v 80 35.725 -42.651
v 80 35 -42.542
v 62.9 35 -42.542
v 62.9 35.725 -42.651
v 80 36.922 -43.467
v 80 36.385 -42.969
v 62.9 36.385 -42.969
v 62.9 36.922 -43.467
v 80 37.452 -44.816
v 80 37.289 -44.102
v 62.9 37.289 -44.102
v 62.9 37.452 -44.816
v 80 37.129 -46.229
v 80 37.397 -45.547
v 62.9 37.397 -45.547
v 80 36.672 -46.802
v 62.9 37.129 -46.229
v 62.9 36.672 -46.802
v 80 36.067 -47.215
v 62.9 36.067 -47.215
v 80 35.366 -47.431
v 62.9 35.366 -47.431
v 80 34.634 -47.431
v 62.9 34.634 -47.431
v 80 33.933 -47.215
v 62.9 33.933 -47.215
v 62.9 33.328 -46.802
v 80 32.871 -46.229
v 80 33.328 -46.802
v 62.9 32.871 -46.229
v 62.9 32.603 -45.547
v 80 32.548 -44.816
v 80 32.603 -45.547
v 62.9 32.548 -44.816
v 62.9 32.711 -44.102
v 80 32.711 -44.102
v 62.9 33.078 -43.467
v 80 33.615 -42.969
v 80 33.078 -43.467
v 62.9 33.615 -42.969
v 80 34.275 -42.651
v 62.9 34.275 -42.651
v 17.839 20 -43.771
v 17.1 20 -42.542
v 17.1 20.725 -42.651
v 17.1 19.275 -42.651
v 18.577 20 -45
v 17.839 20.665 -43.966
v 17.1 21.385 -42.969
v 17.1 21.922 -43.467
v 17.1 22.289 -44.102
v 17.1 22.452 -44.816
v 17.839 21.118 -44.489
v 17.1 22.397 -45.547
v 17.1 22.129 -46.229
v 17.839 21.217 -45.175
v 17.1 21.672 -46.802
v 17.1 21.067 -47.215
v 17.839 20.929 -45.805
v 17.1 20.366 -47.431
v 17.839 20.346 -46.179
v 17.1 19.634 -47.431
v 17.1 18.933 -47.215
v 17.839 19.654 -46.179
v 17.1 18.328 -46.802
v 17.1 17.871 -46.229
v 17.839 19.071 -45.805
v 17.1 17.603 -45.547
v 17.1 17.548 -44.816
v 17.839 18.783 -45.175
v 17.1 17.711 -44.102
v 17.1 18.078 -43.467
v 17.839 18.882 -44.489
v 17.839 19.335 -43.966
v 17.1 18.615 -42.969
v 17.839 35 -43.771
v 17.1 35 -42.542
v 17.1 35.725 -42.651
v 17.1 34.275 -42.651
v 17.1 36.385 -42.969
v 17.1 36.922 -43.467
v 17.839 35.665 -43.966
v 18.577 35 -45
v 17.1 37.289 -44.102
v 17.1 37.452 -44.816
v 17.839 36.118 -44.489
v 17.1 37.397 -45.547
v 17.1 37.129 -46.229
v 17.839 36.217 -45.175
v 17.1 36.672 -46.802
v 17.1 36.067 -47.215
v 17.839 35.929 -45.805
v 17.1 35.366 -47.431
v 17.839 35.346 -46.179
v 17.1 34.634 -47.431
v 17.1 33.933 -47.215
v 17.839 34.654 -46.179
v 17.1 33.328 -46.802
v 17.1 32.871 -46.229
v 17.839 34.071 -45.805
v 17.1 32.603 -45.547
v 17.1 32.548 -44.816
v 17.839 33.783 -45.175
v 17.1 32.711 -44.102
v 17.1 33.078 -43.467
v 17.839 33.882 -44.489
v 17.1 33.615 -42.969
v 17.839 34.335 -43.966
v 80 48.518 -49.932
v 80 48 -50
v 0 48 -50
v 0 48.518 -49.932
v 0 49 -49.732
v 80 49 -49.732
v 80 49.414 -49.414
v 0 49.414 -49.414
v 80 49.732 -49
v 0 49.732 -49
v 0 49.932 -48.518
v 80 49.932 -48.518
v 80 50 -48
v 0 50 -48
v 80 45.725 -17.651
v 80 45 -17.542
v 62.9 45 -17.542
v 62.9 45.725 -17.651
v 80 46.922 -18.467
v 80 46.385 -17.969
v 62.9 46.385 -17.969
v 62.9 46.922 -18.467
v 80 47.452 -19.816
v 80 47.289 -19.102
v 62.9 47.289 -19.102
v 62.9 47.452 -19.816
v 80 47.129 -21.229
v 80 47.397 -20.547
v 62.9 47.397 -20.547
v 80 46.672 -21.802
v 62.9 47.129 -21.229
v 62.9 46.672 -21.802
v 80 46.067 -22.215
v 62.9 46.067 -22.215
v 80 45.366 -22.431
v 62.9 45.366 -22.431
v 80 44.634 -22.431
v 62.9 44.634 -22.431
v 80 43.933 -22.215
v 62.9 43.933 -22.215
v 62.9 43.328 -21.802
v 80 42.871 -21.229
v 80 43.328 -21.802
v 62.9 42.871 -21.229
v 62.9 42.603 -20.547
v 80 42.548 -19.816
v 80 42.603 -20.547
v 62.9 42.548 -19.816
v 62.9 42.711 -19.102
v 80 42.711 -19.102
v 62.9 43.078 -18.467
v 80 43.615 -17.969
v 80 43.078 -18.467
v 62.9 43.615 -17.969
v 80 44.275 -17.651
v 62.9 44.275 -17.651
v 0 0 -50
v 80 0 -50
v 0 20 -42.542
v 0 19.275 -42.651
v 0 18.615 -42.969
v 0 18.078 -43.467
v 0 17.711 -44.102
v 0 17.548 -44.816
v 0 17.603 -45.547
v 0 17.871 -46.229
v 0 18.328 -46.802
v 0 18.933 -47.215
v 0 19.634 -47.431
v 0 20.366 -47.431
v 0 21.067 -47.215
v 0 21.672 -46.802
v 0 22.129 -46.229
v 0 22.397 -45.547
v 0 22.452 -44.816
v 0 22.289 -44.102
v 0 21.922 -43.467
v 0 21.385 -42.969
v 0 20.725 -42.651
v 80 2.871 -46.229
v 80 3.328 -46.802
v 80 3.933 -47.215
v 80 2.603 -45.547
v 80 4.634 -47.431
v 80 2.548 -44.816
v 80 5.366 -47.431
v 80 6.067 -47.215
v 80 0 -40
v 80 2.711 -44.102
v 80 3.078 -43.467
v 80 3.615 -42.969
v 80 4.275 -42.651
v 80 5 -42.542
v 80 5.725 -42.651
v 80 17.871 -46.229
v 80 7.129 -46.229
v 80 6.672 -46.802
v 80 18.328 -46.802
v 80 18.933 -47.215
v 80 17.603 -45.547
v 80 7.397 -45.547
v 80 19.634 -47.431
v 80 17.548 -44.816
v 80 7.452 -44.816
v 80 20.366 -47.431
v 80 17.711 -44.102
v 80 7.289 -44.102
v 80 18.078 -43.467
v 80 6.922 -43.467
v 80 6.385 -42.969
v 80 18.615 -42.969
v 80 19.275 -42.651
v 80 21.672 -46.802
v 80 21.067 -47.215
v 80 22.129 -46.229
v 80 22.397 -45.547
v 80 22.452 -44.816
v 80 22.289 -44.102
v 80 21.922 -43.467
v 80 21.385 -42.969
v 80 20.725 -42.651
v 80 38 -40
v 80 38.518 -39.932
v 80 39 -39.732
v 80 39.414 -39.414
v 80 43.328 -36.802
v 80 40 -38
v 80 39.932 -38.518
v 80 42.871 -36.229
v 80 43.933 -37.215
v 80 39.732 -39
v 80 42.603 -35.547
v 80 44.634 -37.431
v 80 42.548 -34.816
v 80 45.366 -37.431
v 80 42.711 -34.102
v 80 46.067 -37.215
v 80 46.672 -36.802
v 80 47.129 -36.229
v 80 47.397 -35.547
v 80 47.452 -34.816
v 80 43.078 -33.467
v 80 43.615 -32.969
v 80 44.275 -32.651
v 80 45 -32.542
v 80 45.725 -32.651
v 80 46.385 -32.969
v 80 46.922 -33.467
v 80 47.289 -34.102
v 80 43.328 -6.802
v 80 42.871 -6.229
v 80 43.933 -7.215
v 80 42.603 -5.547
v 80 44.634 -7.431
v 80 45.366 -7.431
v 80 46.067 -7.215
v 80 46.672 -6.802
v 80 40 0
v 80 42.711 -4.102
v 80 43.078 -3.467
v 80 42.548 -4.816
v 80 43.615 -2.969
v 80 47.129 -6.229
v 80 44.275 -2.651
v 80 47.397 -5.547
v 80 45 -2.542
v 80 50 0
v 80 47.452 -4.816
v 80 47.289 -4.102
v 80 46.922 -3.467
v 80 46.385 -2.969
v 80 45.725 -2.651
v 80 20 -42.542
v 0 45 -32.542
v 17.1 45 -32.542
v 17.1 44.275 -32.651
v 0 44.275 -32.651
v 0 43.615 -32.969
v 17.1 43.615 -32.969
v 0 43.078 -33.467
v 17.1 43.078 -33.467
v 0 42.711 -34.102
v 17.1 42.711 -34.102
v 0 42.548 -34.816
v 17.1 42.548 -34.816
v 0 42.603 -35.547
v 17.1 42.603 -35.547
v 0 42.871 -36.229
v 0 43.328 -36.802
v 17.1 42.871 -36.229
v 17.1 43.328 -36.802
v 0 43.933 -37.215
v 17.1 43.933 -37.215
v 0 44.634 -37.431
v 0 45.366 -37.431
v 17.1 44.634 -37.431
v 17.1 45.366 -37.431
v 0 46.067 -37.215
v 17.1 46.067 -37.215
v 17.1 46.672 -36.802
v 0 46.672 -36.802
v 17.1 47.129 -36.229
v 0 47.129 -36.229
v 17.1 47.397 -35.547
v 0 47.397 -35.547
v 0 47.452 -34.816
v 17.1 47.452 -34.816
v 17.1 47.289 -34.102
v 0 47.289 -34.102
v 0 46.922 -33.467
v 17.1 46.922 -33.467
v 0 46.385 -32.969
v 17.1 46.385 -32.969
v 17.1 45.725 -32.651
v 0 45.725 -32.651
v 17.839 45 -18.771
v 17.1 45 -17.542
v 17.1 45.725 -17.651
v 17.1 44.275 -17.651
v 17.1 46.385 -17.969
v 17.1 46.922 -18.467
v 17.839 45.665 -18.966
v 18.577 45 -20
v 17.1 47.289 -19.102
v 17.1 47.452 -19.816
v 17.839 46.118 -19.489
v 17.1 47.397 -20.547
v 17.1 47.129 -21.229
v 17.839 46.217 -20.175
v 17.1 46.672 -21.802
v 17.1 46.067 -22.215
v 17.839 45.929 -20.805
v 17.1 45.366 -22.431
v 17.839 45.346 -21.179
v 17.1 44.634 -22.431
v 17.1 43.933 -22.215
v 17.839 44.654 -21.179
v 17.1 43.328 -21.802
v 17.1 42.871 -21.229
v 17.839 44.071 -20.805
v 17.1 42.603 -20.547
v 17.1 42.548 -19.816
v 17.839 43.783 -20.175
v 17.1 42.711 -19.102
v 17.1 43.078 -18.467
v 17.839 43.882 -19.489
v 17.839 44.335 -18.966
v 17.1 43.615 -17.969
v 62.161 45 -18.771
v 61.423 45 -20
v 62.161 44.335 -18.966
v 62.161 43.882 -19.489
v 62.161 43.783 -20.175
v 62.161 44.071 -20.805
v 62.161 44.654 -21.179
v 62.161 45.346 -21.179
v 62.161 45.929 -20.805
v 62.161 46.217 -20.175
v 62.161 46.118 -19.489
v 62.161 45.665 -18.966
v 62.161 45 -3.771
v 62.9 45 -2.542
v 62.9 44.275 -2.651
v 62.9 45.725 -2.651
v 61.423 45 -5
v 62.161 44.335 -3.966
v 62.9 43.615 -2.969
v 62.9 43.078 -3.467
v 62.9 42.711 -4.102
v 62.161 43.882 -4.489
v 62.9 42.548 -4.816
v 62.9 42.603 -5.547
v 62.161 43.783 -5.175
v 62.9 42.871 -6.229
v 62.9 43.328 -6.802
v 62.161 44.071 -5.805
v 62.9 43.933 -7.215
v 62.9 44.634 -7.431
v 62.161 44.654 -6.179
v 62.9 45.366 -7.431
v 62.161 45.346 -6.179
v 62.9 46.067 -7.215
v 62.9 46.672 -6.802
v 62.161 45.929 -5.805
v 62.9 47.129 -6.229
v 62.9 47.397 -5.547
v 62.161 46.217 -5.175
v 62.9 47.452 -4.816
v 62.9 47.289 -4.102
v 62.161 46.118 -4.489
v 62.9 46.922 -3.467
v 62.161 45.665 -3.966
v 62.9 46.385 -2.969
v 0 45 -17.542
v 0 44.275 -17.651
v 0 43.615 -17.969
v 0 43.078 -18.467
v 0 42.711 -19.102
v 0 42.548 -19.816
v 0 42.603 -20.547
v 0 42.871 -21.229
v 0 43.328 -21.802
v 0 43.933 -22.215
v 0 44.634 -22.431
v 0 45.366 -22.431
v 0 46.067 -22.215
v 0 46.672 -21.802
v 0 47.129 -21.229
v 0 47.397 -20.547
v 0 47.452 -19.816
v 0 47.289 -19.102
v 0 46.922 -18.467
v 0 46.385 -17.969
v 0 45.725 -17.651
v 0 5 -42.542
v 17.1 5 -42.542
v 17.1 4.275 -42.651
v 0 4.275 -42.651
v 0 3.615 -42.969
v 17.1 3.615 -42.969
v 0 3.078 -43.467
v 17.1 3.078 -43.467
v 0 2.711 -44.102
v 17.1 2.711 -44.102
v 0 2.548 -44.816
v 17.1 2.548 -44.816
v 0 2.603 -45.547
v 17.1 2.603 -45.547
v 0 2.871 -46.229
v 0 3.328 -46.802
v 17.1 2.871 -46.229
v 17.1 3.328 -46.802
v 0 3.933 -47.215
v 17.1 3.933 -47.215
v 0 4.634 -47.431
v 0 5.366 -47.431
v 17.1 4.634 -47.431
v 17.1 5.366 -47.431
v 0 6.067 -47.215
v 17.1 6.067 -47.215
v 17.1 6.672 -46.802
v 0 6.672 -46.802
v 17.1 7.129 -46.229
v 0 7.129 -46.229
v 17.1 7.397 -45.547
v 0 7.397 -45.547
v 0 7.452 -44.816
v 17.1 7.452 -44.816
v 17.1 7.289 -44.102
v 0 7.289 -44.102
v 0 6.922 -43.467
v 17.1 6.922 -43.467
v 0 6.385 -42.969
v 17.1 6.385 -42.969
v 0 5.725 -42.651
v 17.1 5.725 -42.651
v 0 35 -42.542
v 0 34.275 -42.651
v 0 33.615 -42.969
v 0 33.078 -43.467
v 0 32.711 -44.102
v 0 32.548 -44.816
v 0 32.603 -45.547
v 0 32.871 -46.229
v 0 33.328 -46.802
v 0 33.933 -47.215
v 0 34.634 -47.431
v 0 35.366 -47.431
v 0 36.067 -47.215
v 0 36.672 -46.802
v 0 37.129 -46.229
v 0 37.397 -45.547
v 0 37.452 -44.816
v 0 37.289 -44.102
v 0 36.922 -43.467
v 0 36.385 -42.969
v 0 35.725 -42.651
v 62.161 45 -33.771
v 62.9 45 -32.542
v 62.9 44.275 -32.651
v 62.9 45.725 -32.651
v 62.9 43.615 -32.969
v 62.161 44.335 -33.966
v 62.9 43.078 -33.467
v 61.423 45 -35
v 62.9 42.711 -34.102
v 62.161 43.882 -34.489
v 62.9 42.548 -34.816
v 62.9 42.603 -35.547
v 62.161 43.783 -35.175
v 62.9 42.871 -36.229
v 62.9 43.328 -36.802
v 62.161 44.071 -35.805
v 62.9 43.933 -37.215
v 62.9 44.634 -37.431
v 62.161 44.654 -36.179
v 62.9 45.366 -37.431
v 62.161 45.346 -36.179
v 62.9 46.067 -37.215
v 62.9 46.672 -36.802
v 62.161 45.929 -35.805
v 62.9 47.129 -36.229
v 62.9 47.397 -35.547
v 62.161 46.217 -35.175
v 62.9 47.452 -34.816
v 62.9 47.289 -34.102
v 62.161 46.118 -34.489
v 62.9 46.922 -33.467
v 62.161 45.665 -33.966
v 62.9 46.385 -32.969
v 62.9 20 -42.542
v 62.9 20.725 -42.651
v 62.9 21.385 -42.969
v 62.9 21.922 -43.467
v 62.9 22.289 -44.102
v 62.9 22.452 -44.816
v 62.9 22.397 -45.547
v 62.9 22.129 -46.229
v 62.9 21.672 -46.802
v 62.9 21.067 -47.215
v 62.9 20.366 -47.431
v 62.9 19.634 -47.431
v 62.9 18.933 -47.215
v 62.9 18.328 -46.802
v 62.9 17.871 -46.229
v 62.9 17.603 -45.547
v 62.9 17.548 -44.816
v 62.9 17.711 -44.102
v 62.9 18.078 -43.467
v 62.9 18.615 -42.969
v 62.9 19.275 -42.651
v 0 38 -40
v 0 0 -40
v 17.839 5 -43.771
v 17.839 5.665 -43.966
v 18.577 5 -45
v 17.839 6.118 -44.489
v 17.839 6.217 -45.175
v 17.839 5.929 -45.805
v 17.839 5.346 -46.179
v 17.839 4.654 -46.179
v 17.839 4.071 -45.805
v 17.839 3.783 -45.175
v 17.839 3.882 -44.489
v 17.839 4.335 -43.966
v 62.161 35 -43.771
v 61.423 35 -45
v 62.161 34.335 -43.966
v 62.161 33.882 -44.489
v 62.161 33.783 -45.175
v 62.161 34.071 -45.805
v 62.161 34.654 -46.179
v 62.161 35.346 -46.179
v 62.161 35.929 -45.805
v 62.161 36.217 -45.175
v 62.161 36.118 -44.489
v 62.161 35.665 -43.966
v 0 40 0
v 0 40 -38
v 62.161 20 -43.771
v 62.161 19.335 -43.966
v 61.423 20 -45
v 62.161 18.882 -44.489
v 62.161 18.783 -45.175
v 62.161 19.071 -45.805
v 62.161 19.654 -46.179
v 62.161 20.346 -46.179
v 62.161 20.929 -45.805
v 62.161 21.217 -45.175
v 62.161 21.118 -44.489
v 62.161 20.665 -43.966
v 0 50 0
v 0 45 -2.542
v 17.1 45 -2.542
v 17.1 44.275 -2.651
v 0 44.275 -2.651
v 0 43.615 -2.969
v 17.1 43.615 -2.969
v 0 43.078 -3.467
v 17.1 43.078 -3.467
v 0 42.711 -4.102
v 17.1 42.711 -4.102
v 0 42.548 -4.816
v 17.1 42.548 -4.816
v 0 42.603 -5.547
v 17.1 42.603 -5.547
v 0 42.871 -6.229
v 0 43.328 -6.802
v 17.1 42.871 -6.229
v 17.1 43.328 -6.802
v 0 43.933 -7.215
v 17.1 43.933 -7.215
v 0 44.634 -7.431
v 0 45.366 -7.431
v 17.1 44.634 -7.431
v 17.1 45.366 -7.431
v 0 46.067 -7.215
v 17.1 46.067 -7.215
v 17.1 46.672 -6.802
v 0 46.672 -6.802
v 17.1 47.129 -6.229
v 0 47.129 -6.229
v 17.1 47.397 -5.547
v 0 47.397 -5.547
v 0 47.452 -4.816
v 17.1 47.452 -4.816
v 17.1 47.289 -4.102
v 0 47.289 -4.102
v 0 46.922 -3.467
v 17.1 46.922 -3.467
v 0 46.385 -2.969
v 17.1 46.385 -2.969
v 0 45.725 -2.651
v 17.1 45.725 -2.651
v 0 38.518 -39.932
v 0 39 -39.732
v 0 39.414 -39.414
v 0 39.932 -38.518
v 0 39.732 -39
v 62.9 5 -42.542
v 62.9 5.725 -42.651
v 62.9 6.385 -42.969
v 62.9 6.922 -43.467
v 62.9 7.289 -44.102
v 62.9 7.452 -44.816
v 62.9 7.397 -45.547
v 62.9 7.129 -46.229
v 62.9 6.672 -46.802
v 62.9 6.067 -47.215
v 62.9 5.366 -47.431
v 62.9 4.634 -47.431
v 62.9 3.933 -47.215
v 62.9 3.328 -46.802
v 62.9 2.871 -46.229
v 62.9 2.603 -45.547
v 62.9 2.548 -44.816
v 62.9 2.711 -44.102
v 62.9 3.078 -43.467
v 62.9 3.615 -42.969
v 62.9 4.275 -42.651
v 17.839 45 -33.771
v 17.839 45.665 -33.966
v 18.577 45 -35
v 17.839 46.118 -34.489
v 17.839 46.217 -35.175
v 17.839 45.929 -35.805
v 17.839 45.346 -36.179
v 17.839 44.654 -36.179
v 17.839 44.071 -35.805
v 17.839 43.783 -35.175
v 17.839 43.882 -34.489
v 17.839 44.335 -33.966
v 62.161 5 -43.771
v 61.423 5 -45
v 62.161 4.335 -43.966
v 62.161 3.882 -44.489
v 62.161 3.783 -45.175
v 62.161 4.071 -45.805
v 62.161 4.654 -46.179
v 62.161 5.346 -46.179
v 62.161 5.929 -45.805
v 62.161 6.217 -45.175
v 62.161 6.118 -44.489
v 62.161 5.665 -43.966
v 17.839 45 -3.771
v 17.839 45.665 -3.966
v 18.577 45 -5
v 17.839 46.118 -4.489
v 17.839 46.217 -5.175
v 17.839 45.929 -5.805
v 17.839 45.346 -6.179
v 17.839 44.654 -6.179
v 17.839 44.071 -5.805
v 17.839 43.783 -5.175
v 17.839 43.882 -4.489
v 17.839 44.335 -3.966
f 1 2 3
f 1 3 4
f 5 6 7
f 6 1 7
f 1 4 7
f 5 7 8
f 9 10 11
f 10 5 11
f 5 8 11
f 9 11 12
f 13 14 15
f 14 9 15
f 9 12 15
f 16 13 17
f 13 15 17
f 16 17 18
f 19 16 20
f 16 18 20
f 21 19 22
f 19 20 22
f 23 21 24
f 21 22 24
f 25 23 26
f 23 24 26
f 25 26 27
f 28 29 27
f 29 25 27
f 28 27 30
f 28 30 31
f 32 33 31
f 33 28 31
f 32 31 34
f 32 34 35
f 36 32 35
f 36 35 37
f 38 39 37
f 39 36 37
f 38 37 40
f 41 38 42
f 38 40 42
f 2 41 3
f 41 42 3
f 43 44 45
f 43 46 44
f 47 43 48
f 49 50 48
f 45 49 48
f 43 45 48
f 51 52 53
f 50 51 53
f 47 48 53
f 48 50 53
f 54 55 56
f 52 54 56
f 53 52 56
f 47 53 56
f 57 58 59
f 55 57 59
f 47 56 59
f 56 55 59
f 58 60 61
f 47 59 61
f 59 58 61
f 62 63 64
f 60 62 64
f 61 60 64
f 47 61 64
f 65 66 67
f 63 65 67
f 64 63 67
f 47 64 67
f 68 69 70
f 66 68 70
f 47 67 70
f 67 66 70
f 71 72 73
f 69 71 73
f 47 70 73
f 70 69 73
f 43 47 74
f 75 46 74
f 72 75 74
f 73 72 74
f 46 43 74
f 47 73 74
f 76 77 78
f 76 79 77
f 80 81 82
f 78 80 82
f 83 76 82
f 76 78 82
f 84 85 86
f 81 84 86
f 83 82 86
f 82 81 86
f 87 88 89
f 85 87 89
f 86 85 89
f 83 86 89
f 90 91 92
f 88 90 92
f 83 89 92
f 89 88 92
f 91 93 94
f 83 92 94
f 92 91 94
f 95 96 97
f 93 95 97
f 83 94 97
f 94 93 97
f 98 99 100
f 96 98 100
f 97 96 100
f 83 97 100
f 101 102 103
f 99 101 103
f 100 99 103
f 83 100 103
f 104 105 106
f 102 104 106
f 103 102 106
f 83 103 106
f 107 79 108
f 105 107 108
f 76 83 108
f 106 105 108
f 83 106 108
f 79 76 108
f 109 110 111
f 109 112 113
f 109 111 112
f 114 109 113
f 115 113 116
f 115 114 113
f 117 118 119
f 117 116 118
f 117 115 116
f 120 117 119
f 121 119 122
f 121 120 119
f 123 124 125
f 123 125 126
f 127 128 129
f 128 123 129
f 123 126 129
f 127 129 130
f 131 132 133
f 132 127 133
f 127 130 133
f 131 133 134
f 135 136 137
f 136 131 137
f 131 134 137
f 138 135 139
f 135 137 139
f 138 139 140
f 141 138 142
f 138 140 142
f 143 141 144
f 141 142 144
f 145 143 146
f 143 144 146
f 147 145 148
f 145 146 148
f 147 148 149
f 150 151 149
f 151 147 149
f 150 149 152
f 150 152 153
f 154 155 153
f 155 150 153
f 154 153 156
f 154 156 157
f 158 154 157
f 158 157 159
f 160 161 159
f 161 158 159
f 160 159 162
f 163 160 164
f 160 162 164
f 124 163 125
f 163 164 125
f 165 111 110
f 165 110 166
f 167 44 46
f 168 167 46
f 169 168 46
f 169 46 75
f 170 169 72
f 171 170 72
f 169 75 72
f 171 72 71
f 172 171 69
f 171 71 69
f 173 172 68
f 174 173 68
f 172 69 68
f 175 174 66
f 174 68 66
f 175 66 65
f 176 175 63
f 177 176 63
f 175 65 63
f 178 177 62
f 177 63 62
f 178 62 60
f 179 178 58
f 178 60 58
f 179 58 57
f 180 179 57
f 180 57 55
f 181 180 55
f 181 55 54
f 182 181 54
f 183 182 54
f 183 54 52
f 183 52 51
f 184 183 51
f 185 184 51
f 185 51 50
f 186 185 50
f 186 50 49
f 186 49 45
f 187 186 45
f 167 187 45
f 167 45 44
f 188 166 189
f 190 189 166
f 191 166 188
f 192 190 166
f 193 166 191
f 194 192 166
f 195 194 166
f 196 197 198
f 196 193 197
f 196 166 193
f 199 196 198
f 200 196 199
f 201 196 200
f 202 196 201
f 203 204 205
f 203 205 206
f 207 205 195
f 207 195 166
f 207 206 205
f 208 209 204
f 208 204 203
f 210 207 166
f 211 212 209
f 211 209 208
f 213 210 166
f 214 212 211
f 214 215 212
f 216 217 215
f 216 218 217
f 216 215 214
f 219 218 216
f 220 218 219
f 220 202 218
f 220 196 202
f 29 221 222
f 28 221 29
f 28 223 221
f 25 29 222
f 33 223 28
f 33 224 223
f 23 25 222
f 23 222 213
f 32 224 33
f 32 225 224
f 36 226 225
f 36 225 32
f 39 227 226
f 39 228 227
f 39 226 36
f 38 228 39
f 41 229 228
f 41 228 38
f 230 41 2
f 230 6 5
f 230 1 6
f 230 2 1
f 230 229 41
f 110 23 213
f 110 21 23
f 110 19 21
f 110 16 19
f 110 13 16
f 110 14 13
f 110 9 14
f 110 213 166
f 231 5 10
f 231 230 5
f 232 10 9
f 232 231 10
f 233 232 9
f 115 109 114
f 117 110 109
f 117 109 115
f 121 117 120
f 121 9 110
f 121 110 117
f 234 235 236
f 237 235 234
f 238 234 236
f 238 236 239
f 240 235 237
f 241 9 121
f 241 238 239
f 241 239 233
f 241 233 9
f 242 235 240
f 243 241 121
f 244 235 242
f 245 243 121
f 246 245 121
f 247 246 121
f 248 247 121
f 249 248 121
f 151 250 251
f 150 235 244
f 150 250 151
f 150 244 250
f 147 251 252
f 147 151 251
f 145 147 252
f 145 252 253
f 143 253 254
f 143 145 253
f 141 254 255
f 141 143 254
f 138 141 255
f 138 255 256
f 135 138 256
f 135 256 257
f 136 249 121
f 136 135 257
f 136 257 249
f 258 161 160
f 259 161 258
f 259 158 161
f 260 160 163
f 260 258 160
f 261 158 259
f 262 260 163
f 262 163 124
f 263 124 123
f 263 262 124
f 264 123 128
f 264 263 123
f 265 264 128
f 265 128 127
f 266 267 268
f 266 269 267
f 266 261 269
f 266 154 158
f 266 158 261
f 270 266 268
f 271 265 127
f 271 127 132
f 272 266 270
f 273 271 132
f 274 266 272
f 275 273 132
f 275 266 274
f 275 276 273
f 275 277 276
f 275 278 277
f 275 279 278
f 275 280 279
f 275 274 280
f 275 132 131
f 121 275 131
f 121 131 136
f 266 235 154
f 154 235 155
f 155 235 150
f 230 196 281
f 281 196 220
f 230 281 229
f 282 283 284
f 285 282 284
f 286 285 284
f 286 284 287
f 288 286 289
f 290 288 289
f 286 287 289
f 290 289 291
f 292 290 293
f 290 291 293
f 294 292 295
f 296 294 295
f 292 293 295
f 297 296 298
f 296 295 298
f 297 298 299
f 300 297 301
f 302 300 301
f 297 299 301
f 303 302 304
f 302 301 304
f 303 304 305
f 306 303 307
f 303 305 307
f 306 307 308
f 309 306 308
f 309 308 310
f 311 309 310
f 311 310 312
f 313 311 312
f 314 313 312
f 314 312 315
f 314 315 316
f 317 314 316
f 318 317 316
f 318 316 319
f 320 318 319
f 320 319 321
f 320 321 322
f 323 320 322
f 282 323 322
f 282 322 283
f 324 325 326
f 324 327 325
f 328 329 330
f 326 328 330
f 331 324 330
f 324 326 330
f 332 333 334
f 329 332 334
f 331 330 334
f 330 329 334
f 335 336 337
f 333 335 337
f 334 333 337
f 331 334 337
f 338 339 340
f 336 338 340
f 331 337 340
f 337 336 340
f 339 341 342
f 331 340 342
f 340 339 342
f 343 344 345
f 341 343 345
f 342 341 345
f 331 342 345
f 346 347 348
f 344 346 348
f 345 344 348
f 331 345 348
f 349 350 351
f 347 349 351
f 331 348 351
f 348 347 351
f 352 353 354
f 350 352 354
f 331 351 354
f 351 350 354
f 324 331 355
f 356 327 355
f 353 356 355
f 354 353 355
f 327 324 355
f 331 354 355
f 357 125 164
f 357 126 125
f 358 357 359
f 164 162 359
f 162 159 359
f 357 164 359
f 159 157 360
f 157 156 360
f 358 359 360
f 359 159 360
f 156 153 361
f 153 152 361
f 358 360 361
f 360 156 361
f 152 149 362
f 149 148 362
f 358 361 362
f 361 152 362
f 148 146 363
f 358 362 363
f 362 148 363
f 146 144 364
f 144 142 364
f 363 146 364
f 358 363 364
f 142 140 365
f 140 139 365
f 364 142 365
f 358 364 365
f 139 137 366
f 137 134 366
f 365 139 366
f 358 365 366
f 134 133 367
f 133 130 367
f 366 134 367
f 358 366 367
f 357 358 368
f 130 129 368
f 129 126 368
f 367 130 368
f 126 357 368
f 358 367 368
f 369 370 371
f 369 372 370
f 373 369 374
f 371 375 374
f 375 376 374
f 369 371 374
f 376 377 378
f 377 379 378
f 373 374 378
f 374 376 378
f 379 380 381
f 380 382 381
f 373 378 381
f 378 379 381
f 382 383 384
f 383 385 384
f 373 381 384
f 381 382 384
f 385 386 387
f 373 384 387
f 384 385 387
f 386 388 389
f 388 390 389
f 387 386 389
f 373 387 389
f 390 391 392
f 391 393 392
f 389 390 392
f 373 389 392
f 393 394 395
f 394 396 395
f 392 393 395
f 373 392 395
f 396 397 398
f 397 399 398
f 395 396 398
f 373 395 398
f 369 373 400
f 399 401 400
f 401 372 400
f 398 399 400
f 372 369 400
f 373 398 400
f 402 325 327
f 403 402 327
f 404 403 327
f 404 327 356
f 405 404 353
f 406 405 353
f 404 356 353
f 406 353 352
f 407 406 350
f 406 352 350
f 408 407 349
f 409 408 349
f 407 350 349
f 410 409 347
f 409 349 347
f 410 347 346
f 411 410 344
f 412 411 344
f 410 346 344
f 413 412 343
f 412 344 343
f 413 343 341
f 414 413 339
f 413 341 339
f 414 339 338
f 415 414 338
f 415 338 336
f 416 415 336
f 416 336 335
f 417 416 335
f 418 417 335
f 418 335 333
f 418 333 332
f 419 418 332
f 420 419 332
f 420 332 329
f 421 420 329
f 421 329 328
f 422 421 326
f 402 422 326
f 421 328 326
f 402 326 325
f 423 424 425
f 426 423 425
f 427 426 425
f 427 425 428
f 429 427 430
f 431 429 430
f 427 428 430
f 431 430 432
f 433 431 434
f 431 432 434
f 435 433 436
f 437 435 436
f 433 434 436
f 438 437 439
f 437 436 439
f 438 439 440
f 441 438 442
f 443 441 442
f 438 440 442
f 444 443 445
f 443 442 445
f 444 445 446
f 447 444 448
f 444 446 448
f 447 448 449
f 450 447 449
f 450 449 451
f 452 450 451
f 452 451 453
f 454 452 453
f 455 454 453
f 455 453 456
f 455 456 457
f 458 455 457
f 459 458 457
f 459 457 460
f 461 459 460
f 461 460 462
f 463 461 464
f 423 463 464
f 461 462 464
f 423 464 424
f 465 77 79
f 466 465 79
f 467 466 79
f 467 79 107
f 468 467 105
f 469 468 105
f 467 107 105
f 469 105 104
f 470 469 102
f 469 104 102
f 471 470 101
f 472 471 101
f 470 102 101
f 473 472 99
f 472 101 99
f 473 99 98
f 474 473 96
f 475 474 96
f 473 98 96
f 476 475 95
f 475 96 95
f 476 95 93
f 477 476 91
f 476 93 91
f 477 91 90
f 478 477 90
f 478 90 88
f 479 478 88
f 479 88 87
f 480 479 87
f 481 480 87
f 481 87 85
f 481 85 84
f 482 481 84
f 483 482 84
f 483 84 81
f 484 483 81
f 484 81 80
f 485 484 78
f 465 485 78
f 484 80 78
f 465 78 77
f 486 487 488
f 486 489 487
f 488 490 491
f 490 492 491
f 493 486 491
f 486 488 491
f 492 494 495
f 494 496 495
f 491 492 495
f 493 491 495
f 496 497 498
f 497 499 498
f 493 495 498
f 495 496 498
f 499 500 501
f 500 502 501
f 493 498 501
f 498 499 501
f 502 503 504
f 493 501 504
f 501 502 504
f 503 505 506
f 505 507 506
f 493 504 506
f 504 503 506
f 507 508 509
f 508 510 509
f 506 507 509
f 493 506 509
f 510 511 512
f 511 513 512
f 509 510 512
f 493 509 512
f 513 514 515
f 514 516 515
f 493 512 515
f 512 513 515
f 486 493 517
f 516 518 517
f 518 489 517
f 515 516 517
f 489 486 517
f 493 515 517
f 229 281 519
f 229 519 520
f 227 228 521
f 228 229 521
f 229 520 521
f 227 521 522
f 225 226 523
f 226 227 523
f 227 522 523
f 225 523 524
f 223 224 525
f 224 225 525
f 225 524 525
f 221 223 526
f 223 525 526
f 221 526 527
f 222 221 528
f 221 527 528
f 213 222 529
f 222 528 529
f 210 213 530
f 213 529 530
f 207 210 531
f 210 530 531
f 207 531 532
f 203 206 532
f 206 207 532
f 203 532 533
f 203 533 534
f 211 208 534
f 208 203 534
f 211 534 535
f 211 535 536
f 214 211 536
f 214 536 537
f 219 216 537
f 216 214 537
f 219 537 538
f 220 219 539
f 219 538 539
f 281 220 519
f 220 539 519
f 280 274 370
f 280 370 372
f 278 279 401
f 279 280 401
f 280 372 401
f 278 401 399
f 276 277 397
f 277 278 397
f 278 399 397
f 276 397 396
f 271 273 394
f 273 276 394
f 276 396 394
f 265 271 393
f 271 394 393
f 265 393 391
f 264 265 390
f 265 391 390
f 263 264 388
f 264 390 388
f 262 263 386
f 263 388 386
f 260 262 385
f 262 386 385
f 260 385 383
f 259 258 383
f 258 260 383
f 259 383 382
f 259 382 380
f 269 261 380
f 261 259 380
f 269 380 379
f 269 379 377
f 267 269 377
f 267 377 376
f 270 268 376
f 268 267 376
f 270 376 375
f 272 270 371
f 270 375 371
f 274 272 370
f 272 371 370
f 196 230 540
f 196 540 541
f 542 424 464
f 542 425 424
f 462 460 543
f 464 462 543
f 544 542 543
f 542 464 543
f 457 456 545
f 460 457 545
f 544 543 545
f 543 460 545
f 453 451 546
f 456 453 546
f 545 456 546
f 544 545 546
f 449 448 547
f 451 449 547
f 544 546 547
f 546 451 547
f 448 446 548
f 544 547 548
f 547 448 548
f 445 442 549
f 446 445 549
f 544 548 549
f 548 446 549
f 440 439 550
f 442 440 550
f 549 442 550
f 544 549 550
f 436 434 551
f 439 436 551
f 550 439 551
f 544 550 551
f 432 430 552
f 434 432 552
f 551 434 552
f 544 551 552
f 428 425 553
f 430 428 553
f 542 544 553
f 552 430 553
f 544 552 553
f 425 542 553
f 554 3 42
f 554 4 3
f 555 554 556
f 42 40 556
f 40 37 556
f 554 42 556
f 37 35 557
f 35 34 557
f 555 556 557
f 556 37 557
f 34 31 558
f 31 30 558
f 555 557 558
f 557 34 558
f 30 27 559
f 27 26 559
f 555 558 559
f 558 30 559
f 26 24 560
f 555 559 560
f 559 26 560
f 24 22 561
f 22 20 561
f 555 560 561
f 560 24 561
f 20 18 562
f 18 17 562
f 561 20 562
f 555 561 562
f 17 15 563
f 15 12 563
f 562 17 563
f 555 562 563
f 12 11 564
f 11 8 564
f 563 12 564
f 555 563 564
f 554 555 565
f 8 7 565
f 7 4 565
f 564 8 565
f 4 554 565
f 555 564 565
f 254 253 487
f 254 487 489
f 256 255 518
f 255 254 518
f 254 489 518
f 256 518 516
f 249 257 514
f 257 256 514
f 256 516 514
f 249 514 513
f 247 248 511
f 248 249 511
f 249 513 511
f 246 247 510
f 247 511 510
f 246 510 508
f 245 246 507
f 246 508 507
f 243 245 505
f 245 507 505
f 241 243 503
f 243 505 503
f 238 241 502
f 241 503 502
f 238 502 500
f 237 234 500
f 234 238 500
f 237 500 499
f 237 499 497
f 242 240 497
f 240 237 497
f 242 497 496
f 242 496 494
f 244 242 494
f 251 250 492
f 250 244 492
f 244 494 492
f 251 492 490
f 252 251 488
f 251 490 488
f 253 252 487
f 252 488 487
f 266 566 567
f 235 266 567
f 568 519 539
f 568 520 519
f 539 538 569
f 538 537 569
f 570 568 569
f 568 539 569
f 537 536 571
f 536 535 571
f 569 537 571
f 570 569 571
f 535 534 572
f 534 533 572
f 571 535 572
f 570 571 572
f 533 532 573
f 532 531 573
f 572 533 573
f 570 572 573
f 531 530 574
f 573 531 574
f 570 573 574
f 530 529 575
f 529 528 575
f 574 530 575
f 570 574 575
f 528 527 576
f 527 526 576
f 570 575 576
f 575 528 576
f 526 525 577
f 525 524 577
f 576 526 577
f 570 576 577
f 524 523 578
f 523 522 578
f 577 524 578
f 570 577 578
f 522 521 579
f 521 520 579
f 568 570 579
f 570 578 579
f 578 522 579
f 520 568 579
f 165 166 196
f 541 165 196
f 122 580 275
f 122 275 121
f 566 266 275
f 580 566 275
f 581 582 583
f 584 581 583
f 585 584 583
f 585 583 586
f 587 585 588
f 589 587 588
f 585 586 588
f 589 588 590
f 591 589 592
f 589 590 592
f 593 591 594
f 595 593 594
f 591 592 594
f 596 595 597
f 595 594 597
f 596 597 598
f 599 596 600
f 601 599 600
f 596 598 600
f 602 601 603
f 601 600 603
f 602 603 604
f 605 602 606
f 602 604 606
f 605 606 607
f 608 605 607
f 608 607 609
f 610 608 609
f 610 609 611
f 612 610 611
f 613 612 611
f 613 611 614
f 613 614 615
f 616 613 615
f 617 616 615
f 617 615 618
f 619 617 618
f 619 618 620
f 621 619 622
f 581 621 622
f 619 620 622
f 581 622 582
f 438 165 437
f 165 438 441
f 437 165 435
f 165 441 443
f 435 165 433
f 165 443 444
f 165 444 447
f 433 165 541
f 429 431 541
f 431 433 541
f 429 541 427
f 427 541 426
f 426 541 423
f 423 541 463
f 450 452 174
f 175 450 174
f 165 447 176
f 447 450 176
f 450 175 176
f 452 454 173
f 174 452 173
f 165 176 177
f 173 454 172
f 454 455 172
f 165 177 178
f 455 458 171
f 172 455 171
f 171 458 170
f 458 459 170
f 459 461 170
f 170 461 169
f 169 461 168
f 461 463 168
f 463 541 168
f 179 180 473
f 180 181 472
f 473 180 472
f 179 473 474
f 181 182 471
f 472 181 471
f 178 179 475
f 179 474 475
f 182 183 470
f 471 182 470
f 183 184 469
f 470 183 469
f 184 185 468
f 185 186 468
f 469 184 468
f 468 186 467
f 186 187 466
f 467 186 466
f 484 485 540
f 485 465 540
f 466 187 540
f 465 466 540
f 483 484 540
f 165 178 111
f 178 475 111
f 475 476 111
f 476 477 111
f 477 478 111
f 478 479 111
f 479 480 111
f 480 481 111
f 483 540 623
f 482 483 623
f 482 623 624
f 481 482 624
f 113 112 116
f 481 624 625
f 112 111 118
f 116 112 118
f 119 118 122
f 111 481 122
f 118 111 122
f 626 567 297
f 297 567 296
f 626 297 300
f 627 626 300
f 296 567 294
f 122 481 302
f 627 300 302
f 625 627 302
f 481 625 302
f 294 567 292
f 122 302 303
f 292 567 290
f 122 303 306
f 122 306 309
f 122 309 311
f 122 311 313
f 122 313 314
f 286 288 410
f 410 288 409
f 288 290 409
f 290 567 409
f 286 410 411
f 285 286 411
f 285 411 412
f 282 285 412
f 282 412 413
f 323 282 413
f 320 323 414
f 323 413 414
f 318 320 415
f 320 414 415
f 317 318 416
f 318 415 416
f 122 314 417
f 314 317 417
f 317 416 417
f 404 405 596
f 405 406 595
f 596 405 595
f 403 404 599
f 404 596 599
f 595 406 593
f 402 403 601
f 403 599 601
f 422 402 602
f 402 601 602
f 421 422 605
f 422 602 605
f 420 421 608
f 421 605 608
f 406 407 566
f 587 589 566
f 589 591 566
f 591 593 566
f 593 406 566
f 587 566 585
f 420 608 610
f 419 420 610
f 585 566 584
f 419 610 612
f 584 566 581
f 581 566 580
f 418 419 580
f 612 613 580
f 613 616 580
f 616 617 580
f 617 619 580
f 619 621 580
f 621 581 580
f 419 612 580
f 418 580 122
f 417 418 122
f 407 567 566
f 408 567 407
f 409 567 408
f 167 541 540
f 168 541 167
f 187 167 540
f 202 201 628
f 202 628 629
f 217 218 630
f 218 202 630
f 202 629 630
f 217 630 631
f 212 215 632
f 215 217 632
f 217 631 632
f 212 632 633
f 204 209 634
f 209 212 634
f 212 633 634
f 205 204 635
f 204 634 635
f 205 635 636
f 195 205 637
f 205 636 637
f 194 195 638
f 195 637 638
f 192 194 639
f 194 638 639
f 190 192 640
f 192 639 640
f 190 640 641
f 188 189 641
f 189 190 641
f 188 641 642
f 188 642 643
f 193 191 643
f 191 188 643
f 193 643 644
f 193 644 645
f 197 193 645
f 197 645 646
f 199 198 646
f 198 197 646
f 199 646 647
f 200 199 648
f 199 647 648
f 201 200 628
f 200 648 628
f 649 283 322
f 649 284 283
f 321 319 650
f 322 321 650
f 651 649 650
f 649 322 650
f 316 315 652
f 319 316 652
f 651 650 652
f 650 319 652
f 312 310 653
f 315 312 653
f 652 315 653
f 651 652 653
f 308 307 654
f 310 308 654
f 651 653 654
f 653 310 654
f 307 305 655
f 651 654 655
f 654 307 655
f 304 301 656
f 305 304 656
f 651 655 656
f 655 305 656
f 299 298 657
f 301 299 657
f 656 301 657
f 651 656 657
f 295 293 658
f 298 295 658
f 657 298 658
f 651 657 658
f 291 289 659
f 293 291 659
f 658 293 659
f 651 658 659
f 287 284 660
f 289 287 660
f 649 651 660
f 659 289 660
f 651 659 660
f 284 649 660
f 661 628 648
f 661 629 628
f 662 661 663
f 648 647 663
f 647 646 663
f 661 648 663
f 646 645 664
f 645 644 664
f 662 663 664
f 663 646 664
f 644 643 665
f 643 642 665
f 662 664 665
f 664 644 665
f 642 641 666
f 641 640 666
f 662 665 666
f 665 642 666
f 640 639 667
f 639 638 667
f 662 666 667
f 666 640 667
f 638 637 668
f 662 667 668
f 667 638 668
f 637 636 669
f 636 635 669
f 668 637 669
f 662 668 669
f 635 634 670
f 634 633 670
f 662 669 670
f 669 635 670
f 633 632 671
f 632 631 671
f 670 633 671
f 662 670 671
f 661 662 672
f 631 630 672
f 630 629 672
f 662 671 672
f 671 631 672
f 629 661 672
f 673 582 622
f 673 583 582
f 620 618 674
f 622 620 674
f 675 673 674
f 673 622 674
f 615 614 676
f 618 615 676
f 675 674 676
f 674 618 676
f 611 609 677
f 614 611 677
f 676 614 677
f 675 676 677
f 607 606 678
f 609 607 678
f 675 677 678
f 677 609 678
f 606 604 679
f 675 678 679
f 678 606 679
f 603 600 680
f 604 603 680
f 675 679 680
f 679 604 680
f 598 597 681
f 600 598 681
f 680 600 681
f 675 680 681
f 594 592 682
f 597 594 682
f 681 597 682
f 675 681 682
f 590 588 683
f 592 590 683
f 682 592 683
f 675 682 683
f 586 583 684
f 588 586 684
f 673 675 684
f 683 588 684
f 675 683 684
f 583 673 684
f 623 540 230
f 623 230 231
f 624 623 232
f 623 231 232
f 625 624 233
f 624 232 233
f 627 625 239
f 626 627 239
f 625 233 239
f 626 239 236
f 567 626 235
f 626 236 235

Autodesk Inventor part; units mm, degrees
ref_plane "YZ Plane" through (0, 0, 0) normal (1, 0, 0) x (0, 1, 0)
ref_plane "XZ Plane" through (0, 0, 0) normal (0, 1, 0) x (-1, 0, 0)
sketch "Sketch2" plane through (0, 0, 0) normal (1, 0, 0) x (0, 1, 0)
  line L0 (0, 0) -> (50, 0)
  line L1 (50, 0) -> (50, -50)
  line L2 (50, -50) -> (0, -50)
  line L3 (0, -50) -> (0, 0)
  line L4 (0, 0) -> (40, 0)
  line L5 (40, 0) -> (40, -40)
  line L6 (40, -40) -> (0, -40)
  line L7 (0, -40) -> (0, 0)
  dimension "d5" = 50
  dimension "d6" = 50
  dimension "d7" = 10
  dimension "d8" = 10
extrude "Extrusion1" add sketch "Sketch2" along normal blind 80 contours L0 L1 L2 L3 L6 L5
fillet "Fillet1" radius 2 2 edges at (40, 40, -40) (40, 50, -50)
sketch "Sketch6" plane through (0, 0, 0) normal (-1, 0, 0) x (0, 0, 1)
  line L0 (-40, 0) -> (-50, 0) projected
  line L1 (-45, 0) -> (-45, 50)
  line L2 (-48, 50) -> (0, 50) projected
  line L3 (0, 50) -> (0, 40) projected
  line L4 (0, 45) -> (-50, 45)
  point P0 (0, 0)
  point P1 (-50, 50)
  point P2 (-5, 45)
  point P3 (-20, 45)
  point P4 (-35, 45)
  point P5 (-45, 35)
  point P6 (-45, 5)
  point P7 (-45, 20)
  dimension "d23" = 5
  dimension "d25" = 20
  dimension "d26" = 35
  dimension "d27" = 5
  dimension "d28" = 20
  dimension "d29" = 35
hole "Hole1" at (0, 45, -5) at (0, 45, -20) at (0, 45, -35) at (0, 35, -45) at (0, 5, -45) at (0, 20, -45) direction (1, 0, 0) diameter 4.917 depth 17.1 tip angle 118 thread size "M6x1" class "6H" standard "ISO Metric profile"
ref_plane "Work Plane1" through (40, 0, 0) normal (-1, 0, 0) x (0, 0, 1)
mirror "Mirror1" about plane through (40, 0, 0) normal (-1, 0, 0) of "Hole1"
ref_plane "Work Plane2" through (40, 0, 0) normal (-1, 0, 0) x (0, 0, 1)
properties part number "Profile_Middle_02"
